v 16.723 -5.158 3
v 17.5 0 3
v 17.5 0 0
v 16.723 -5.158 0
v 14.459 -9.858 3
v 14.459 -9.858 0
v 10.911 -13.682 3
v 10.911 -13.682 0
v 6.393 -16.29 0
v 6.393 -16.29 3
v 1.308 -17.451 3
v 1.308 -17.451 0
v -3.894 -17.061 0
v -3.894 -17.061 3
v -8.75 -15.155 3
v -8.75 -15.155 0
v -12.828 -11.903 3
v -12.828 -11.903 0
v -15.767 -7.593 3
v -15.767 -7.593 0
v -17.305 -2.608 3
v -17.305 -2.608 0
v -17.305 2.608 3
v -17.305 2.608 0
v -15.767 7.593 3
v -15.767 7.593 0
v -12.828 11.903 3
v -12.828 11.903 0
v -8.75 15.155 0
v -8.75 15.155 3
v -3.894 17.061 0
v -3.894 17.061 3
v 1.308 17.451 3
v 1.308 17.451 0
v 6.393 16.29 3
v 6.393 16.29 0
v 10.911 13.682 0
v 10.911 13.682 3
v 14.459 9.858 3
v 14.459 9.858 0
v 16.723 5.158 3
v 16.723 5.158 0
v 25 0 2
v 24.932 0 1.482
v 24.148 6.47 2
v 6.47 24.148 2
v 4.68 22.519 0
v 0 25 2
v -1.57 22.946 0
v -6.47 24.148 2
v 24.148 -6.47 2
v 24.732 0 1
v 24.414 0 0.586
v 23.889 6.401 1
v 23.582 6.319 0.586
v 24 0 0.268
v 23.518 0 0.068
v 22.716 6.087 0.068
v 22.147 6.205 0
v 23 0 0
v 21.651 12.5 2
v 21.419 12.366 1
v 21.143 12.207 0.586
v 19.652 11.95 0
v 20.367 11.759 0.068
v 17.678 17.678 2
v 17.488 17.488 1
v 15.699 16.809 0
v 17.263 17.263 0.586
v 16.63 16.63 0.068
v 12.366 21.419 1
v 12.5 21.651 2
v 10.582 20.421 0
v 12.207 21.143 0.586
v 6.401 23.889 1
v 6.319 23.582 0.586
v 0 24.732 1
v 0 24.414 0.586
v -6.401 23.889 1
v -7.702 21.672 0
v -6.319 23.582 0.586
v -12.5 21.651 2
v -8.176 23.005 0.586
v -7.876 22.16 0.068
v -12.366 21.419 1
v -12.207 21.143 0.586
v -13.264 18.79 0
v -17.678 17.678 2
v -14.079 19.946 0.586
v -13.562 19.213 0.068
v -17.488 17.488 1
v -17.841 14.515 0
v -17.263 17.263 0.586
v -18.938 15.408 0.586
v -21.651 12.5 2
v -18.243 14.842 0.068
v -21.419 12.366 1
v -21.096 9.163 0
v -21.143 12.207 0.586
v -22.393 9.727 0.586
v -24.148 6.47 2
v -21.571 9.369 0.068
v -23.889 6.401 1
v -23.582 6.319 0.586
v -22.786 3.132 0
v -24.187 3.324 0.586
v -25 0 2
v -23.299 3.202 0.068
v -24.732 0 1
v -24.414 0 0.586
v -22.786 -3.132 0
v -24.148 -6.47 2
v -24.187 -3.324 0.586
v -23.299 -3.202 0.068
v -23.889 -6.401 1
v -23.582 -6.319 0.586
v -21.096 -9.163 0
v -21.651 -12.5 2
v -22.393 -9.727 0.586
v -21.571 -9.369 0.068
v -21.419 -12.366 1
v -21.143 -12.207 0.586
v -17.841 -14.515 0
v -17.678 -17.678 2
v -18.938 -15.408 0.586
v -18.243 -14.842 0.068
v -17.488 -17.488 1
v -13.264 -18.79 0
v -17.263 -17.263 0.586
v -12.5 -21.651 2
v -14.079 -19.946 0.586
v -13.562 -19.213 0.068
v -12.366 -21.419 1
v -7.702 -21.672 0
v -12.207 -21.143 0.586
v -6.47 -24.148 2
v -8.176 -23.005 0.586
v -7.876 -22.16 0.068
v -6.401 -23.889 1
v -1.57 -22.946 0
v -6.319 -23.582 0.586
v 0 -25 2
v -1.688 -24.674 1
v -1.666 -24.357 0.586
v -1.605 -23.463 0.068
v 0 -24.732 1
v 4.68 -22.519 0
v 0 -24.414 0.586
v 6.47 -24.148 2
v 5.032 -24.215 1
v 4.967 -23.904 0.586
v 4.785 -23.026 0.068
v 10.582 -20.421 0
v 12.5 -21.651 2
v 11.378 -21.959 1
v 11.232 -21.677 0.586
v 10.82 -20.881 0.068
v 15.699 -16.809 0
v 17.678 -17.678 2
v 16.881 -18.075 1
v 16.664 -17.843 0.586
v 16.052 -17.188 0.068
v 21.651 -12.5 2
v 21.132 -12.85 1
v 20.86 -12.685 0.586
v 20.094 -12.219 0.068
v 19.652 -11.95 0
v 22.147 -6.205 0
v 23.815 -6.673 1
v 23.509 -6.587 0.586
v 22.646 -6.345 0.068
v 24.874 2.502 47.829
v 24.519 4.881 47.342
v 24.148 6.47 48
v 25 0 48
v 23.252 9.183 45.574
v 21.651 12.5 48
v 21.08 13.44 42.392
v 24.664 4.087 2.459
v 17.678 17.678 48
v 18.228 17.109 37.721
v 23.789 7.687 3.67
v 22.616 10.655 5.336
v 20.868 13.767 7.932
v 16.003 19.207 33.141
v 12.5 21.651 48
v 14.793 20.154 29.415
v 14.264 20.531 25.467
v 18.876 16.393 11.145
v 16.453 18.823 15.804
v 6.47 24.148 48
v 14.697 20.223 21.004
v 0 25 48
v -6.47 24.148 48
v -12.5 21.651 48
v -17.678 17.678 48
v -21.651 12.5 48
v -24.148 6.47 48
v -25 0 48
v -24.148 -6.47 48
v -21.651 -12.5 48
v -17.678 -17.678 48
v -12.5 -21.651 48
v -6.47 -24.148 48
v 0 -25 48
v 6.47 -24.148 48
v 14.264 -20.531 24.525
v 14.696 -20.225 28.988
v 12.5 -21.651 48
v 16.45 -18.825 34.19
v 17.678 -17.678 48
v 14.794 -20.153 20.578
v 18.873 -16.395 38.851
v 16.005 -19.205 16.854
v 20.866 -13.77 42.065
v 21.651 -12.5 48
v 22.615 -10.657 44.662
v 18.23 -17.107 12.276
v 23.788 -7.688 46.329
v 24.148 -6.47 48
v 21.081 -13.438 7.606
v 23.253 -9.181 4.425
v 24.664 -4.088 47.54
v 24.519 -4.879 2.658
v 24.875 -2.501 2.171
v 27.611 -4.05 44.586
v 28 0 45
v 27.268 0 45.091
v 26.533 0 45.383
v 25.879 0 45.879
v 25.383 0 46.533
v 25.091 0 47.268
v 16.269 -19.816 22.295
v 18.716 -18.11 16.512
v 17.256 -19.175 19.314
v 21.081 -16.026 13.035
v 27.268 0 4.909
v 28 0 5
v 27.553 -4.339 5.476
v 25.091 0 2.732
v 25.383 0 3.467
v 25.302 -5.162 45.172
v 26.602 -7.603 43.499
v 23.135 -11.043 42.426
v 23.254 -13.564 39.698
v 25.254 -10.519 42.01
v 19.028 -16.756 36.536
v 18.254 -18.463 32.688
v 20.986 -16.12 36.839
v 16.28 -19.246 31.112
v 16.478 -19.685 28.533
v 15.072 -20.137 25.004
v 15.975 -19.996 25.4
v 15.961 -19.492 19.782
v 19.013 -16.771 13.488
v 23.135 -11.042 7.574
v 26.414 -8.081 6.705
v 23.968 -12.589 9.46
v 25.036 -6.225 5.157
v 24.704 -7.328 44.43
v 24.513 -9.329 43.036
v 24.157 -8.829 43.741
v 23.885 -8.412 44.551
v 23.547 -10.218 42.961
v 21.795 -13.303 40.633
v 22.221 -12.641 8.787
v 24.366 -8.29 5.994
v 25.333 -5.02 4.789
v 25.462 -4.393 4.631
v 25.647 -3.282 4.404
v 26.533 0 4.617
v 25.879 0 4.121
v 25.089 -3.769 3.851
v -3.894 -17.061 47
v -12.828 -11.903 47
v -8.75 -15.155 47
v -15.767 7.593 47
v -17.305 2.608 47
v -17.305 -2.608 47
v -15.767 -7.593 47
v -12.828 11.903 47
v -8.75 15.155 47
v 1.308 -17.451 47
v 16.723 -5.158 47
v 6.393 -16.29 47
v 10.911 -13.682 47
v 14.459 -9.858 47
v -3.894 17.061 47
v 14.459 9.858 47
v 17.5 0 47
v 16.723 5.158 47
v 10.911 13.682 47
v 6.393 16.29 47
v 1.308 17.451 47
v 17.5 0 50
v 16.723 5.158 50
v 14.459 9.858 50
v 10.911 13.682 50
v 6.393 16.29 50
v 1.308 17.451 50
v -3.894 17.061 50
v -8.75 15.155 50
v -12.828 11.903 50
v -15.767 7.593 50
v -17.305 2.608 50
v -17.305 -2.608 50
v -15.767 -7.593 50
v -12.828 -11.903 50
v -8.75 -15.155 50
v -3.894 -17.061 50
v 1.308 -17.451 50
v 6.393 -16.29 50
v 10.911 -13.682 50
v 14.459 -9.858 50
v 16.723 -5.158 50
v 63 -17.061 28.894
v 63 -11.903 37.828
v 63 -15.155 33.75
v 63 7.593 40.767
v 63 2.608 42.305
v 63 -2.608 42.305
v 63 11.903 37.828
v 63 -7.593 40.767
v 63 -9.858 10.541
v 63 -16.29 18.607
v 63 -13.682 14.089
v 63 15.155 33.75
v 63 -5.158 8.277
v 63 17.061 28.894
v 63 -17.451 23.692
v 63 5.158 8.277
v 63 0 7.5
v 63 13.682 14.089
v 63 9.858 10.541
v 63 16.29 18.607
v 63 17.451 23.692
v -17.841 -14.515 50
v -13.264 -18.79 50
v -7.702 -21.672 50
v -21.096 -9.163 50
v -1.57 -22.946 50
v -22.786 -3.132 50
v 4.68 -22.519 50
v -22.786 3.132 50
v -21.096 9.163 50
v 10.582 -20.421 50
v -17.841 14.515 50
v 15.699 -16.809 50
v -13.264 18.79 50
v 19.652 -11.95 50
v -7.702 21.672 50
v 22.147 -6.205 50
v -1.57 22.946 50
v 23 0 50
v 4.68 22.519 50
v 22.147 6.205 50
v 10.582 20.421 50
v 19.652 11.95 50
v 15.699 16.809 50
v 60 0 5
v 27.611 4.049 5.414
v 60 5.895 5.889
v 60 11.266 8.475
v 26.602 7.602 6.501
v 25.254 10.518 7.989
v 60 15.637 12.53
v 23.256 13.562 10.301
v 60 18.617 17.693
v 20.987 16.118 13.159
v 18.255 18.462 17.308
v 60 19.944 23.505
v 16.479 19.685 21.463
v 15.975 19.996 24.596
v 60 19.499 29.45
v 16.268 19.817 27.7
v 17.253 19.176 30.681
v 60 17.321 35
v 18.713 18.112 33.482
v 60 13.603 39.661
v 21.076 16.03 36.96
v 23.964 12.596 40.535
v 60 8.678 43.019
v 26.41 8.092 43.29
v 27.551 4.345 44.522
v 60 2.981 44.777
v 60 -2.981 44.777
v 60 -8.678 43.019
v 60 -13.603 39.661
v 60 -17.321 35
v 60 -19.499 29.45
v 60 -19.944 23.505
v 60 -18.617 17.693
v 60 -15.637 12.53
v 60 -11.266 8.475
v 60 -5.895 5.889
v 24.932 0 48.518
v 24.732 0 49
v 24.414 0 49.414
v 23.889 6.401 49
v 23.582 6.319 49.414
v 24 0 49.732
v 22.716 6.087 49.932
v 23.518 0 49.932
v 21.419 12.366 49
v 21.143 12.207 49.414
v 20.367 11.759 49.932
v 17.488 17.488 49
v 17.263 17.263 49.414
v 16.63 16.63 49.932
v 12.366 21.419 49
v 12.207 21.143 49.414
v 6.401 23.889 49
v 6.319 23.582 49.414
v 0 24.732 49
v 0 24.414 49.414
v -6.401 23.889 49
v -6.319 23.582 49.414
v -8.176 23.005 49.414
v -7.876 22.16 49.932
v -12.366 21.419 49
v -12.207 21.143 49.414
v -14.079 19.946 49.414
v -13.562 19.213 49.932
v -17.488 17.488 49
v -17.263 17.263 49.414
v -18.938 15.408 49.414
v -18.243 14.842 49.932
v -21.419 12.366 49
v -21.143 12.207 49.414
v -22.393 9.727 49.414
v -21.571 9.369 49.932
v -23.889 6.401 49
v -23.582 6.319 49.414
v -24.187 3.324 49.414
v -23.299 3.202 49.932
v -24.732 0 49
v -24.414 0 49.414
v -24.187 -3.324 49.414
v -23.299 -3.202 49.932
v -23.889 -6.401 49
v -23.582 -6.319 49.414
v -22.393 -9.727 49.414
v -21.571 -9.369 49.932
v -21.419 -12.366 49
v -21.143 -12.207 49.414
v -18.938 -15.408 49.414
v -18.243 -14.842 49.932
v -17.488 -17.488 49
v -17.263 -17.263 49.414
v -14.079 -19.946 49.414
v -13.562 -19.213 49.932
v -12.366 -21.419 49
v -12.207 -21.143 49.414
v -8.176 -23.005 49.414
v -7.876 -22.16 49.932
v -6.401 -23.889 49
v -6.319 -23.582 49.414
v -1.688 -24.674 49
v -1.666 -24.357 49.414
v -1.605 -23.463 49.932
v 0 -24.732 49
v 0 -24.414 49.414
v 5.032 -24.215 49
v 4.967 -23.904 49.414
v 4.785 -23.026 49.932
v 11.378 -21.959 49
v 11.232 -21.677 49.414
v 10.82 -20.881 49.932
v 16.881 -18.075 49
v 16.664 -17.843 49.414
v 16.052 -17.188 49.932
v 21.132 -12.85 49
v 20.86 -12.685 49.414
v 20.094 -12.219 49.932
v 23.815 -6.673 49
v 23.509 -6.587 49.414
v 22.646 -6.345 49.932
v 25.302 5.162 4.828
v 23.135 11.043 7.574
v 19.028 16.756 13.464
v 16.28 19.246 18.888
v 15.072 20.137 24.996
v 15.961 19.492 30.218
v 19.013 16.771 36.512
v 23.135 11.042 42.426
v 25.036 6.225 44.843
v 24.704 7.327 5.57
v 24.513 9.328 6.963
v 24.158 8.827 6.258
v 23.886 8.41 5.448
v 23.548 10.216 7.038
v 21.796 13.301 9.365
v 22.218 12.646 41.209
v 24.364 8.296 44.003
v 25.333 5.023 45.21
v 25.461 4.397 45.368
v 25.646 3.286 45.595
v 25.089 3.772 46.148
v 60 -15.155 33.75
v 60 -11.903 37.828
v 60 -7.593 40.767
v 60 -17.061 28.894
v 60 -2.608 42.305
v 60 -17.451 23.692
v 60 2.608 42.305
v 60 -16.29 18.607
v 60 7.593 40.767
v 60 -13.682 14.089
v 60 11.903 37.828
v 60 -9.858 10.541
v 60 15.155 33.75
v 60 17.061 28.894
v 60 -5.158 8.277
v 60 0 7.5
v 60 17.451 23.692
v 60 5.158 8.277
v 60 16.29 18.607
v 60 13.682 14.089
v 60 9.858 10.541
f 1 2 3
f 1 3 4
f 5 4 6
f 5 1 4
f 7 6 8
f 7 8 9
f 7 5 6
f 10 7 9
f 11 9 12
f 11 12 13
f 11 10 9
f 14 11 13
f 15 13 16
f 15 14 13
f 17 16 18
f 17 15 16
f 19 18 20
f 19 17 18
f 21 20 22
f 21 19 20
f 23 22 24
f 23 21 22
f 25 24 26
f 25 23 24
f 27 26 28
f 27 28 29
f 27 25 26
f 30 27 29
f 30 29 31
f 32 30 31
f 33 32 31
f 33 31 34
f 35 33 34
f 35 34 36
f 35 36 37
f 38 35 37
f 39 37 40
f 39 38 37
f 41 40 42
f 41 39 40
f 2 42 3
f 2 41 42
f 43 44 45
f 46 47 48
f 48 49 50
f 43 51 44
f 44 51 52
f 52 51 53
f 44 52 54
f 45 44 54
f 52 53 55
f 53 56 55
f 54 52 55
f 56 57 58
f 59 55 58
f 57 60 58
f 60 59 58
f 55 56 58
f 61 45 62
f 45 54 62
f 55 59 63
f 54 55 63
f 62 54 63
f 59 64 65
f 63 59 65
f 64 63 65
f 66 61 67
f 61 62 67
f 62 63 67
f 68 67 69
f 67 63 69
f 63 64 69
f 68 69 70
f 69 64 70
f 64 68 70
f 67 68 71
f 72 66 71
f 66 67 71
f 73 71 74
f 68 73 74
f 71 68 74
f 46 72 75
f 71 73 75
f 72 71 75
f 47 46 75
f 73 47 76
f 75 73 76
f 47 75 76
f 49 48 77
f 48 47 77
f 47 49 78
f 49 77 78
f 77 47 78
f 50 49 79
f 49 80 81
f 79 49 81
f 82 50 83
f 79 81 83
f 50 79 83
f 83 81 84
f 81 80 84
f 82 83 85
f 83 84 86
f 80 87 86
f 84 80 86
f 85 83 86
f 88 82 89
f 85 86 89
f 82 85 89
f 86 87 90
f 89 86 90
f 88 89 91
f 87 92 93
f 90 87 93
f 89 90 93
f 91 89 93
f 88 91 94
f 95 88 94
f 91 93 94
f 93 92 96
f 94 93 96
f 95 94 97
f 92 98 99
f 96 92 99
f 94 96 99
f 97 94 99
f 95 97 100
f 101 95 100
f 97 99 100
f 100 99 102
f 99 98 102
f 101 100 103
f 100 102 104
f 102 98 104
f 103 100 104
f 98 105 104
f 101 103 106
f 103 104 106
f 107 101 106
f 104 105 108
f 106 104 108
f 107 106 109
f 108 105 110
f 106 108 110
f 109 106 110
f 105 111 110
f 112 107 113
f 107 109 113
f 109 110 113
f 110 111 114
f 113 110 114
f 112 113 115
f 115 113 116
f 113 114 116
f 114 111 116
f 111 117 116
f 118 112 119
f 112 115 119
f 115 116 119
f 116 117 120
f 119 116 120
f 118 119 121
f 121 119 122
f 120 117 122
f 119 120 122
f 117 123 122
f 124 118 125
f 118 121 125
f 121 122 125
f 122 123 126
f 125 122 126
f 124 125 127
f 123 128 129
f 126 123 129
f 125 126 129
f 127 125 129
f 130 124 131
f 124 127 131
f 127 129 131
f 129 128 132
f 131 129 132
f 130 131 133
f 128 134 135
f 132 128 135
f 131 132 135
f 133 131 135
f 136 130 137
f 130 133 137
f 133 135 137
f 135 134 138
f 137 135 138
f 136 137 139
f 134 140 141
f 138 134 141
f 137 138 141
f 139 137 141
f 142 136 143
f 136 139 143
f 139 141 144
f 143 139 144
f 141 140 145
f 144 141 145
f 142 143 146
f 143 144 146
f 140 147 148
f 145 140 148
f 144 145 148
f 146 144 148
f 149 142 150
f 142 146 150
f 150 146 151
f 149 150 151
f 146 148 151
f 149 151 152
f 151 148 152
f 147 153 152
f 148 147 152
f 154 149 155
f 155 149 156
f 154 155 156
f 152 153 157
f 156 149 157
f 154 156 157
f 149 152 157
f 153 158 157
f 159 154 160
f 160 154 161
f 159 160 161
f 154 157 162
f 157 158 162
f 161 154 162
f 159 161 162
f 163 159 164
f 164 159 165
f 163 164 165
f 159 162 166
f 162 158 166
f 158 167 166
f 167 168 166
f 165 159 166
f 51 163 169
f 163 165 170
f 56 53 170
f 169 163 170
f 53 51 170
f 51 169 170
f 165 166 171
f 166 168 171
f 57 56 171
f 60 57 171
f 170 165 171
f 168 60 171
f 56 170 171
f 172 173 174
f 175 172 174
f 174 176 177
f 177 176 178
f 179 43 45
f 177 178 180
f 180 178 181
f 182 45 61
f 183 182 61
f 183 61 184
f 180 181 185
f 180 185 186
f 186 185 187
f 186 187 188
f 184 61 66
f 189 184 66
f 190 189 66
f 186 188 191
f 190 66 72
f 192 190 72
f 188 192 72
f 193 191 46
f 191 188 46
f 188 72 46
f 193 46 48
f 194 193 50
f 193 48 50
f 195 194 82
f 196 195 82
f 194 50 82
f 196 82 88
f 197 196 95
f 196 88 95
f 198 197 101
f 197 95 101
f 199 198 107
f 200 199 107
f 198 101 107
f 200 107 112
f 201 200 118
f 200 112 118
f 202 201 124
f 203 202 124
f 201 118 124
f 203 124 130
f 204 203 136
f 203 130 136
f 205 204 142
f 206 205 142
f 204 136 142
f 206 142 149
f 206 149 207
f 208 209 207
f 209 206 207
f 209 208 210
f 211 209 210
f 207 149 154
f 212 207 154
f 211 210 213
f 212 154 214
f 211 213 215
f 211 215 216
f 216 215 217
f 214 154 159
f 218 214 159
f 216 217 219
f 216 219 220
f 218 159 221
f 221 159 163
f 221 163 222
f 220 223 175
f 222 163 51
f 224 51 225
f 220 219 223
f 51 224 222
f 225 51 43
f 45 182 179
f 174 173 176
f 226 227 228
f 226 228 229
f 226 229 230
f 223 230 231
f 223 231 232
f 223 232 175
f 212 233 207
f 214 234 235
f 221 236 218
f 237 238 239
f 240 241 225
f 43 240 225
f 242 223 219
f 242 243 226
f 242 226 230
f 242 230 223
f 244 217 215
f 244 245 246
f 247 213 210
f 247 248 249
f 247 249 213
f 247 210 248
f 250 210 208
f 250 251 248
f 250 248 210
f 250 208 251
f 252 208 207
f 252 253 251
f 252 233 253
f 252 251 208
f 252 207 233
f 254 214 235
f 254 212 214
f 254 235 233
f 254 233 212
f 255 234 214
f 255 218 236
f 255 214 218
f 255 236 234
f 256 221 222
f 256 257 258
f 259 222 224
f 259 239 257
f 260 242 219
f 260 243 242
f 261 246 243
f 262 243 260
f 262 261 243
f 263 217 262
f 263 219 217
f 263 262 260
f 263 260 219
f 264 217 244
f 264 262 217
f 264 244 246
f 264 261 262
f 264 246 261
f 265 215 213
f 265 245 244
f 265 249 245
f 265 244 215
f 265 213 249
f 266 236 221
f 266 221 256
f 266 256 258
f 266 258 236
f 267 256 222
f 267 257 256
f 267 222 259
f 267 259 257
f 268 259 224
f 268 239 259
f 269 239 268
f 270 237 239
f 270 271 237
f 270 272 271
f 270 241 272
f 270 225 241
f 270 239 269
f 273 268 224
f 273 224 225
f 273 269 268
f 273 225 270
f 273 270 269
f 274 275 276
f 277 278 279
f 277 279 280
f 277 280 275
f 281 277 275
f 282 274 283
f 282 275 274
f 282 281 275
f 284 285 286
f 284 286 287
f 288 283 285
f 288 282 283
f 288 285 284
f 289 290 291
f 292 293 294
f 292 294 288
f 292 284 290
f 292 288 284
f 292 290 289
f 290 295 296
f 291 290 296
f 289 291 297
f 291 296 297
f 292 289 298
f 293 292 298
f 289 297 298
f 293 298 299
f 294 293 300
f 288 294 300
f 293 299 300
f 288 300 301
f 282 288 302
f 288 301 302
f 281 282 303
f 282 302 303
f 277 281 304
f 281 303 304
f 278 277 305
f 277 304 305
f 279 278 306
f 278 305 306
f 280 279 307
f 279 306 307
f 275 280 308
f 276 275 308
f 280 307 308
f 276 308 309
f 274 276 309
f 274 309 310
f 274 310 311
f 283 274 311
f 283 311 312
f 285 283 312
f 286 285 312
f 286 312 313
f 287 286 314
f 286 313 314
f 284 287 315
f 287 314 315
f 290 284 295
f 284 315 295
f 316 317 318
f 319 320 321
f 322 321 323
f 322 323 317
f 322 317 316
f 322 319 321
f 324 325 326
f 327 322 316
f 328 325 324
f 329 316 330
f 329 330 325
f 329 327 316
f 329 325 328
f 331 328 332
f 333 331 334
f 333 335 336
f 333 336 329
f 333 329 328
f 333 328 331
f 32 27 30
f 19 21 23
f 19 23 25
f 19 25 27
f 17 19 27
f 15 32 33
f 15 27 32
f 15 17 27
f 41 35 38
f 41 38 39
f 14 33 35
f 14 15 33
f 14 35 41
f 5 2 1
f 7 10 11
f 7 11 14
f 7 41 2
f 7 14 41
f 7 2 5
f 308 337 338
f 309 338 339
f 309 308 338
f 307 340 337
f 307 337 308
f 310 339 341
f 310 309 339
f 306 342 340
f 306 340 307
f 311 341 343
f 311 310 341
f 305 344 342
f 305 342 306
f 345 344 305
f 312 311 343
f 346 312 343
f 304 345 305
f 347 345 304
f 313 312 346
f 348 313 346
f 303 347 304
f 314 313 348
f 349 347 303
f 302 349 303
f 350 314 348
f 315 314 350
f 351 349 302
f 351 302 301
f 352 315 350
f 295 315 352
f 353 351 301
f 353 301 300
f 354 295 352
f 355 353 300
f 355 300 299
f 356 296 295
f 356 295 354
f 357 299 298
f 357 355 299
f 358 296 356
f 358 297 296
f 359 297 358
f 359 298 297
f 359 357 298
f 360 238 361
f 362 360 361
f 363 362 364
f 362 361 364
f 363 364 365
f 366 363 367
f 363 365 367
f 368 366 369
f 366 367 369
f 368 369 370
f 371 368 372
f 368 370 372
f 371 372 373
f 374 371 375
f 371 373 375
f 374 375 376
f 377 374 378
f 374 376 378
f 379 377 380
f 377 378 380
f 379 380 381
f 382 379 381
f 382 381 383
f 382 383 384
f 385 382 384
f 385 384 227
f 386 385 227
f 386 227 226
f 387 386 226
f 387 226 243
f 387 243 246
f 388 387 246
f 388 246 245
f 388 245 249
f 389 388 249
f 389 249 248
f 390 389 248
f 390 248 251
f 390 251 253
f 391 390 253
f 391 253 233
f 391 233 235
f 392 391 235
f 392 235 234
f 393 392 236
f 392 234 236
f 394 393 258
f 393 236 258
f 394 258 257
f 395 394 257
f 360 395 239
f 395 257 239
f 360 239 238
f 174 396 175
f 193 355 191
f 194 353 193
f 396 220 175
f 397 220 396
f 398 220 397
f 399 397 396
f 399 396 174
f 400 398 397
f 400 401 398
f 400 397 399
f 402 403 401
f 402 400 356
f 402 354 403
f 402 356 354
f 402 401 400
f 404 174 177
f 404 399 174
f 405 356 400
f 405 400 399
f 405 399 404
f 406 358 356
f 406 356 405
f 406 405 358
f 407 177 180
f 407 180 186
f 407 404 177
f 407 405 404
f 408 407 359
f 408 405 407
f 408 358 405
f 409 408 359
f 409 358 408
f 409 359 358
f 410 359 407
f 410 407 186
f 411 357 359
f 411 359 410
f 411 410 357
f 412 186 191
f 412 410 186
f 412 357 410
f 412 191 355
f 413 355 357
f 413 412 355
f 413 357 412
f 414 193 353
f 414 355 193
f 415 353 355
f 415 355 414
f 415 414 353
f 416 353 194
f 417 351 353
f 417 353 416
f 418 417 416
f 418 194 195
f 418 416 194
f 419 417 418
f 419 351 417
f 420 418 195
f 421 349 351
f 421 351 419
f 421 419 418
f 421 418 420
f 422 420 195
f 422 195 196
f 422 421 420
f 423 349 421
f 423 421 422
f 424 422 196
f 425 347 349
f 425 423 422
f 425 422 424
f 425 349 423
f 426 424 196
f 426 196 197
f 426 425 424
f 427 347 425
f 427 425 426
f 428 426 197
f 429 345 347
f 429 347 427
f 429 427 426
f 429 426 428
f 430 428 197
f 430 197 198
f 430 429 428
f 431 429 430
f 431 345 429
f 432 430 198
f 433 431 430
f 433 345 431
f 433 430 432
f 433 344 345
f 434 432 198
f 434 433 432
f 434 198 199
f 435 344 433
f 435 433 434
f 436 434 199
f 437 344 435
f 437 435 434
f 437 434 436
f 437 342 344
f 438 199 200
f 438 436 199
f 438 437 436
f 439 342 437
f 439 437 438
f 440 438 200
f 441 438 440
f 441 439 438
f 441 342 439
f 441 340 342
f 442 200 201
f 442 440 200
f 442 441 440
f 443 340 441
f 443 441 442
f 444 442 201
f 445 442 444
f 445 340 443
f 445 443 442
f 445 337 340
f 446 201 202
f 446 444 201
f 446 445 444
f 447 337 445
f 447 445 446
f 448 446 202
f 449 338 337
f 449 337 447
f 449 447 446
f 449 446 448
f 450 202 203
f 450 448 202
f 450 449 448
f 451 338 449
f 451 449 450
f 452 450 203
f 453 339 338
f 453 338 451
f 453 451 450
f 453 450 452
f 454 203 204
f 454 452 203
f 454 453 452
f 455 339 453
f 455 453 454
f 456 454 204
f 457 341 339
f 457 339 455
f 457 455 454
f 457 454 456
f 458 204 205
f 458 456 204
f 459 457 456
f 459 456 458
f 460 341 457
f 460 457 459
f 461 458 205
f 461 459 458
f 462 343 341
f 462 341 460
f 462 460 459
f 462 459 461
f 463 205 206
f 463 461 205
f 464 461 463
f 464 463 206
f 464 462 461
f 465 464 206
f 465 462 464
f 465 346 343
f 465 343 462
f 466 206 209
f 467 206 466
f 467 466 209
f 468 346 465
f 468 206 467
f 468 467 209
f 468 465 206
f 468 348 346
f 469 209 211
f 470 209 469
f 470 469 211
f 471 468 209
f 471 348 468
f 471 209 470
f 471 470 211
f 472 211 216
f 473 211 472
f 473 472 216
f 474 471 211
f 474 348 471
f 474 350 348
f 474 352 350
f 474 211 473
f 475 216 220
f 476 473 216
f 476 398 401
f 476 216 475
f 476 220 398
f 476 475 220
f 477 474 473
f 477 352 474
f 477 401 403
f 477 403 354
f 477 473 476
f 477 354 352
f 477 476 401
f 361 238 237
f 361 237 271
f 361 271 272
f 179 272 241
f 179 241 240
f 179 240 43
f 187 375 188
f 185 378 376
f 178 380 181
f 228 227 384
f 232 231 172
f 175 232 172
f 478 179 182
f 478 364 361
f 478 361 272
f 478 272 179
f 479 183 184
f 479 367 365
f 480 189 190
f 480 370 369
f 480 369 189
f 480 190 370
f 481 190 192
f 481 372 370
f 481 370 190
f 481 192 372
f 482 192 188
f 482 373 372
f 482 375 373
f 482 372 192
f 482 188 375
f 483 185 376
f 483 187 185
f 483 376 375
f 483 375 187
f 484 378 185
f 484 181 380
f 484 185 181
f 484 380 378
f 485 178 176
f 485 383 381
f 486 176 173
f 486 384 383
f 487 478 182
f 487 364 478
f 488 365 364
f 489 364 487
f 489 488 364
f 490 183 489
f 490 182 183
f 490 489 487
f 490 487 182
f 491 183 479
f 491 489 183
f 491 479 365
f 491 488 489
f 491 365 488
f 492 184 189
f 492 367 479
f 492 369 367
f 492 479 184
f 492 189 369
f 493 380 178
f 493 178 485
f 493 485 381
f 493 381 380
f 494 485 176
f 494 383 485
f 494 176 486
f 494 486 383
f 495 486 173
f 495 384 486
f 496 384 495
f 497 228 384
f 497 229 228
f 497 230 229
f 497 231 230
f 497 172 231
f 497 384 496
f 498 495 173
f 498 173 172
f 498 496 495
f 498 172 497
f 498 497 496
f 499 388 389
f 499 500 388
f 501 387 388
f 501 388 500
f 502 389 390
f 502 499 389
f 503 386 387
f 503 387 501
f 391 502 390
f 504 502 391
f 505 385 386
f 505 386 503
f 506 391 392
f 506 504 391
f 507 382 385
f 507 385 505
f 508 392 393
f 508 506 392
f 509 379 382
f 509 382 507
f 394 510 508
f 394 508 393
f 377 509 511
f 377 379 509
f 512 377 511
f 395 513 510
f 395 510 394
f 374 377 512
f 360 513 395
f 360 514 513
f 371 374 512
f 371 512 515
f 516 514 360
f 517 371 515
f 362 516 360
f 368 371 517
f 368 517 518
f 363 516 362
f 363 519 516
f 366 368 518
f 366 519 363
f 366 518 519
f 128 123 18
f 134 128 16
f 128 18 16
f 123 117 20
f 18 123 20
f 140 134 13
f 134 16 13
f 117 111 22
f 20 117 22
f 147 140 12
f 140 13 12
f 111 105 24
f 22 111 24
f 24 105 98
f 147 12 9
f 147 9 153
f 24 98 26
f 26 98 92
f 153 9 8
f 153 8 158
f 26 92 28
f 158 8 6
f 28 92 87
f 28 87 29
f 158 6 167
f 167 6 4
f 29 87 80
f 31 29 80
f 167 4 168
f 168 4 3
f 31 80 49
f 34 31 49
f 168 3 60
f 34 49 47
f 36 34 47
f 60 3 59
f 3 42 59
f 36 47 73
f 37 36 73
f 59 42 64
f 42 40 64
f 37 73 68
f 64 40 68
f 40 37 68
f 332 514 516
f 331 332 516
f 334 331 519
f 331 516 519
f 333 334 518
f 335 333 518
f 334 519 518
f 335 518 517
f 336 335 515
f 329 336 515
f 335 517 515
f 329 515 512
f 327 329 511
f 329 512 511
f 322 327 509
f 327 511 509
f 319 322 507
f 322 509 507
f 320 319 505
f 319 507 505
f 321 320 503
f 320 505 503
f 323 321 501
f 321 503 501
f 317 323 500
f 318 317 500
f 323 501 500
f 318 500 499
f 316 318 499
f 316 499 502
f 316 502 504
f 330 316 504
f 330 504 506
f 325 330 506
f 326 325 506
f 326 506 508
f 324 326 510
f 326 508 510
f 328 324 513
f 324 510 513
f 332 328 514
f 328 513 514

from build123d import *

# Parameters (mm, degrees)
SKETCH1_R           = 25
BOSS_EXTRUDE1_DEPTH = 50
SKETCH2_R           = 17.5
CUT_EXTRUDE1_DEPTH  = 3
CUT_EXTRUDE2_START  = -3
SKETCH3_R           = 17.5
CUT_EXTRUDE2_DEPTH  = 3
SKETCH4_R           = 20
BOSS_EXTRUDE2_DEPTH = 60
SKETCH5_R           = 17.5
BOSS_EXTRUDE3_DEPTH = 3
FILLET1_R           = 3
FILLET2_R           = 2


with BuildPart() as part:
    # Sketch1 → Boss-Extrude1 (new body)
    with BuildSketch(Plane.XY):
        Circle(SKETCH1_R)
    extrude(amount=BOSS_EXTRUDE1_DEPTH)

    # Sketch2 → Cut-Extrude1 (cut)
    with BuildSketch(Plane.XY.offset(50)):
        Circle(SKETCH2_R)
    extrude(amount=-CUT_EXTRUDE1_DEPTH, mode=Mode.SUBTRACT)

    # Sketch3 → Cut-Extrude2 (cut)
    with BuildSketch(Plane(origin=(0, 0, 0), x_dir=(-1, 0, 0), z_dir=(0, 0, -1)).offset(CUT_EXTRUDE2_START)):
        with Locations(Location((0, 0, 0), (0, 0, 180))):
            Circle(SKETCH3_R)
    extrude(amount=CUT_EXTRUDE2_DEPTH, mode=Mode.SUBTRACT)

    # Sketch4 → Boss-Extrude2 (add)
    with BuildSketch(Plane(origin=(0, 0, 0), x_dir=(0, 0, -1), z_dir=(1, 0, 0))):
        with Locations((-25, 0)):
            Circle(SKETCH4_R)
    extrude(amount=BOSS_EXTRUDE2_DEPTH)

    # Sketch5 → Boss-Extrude3 (add)
    with BuildSketch(Plane(origin=(60, 0, 0), x_dir=(0, 0, -1), z_dir=(1, 0, 0))):
        with Locations((-25, 0)):
            Circle(SKETCH5_R)
    extrude(amount=BOSS_EXTRUDE3_DEPTH)

    # Fillet1
    fillet1_edges = [part.edges().sort_by_distance(p)[0] for p in [
        (15, 20, 25),
    ]]
    fillet(fillet1_edges, radius=FILLET1_R)

    # Fillet2
    fillet2_edges = [part.edges().sort_by_distance(p)[0] for p in [
        (-25, 0, 0),
        (-25, 0, 50),
    ]]
    fillet(fillet2_edges, radius=FILLET2_R - 0.0001)  # a hair under: the kernel refuses the full size


solid = part.part
